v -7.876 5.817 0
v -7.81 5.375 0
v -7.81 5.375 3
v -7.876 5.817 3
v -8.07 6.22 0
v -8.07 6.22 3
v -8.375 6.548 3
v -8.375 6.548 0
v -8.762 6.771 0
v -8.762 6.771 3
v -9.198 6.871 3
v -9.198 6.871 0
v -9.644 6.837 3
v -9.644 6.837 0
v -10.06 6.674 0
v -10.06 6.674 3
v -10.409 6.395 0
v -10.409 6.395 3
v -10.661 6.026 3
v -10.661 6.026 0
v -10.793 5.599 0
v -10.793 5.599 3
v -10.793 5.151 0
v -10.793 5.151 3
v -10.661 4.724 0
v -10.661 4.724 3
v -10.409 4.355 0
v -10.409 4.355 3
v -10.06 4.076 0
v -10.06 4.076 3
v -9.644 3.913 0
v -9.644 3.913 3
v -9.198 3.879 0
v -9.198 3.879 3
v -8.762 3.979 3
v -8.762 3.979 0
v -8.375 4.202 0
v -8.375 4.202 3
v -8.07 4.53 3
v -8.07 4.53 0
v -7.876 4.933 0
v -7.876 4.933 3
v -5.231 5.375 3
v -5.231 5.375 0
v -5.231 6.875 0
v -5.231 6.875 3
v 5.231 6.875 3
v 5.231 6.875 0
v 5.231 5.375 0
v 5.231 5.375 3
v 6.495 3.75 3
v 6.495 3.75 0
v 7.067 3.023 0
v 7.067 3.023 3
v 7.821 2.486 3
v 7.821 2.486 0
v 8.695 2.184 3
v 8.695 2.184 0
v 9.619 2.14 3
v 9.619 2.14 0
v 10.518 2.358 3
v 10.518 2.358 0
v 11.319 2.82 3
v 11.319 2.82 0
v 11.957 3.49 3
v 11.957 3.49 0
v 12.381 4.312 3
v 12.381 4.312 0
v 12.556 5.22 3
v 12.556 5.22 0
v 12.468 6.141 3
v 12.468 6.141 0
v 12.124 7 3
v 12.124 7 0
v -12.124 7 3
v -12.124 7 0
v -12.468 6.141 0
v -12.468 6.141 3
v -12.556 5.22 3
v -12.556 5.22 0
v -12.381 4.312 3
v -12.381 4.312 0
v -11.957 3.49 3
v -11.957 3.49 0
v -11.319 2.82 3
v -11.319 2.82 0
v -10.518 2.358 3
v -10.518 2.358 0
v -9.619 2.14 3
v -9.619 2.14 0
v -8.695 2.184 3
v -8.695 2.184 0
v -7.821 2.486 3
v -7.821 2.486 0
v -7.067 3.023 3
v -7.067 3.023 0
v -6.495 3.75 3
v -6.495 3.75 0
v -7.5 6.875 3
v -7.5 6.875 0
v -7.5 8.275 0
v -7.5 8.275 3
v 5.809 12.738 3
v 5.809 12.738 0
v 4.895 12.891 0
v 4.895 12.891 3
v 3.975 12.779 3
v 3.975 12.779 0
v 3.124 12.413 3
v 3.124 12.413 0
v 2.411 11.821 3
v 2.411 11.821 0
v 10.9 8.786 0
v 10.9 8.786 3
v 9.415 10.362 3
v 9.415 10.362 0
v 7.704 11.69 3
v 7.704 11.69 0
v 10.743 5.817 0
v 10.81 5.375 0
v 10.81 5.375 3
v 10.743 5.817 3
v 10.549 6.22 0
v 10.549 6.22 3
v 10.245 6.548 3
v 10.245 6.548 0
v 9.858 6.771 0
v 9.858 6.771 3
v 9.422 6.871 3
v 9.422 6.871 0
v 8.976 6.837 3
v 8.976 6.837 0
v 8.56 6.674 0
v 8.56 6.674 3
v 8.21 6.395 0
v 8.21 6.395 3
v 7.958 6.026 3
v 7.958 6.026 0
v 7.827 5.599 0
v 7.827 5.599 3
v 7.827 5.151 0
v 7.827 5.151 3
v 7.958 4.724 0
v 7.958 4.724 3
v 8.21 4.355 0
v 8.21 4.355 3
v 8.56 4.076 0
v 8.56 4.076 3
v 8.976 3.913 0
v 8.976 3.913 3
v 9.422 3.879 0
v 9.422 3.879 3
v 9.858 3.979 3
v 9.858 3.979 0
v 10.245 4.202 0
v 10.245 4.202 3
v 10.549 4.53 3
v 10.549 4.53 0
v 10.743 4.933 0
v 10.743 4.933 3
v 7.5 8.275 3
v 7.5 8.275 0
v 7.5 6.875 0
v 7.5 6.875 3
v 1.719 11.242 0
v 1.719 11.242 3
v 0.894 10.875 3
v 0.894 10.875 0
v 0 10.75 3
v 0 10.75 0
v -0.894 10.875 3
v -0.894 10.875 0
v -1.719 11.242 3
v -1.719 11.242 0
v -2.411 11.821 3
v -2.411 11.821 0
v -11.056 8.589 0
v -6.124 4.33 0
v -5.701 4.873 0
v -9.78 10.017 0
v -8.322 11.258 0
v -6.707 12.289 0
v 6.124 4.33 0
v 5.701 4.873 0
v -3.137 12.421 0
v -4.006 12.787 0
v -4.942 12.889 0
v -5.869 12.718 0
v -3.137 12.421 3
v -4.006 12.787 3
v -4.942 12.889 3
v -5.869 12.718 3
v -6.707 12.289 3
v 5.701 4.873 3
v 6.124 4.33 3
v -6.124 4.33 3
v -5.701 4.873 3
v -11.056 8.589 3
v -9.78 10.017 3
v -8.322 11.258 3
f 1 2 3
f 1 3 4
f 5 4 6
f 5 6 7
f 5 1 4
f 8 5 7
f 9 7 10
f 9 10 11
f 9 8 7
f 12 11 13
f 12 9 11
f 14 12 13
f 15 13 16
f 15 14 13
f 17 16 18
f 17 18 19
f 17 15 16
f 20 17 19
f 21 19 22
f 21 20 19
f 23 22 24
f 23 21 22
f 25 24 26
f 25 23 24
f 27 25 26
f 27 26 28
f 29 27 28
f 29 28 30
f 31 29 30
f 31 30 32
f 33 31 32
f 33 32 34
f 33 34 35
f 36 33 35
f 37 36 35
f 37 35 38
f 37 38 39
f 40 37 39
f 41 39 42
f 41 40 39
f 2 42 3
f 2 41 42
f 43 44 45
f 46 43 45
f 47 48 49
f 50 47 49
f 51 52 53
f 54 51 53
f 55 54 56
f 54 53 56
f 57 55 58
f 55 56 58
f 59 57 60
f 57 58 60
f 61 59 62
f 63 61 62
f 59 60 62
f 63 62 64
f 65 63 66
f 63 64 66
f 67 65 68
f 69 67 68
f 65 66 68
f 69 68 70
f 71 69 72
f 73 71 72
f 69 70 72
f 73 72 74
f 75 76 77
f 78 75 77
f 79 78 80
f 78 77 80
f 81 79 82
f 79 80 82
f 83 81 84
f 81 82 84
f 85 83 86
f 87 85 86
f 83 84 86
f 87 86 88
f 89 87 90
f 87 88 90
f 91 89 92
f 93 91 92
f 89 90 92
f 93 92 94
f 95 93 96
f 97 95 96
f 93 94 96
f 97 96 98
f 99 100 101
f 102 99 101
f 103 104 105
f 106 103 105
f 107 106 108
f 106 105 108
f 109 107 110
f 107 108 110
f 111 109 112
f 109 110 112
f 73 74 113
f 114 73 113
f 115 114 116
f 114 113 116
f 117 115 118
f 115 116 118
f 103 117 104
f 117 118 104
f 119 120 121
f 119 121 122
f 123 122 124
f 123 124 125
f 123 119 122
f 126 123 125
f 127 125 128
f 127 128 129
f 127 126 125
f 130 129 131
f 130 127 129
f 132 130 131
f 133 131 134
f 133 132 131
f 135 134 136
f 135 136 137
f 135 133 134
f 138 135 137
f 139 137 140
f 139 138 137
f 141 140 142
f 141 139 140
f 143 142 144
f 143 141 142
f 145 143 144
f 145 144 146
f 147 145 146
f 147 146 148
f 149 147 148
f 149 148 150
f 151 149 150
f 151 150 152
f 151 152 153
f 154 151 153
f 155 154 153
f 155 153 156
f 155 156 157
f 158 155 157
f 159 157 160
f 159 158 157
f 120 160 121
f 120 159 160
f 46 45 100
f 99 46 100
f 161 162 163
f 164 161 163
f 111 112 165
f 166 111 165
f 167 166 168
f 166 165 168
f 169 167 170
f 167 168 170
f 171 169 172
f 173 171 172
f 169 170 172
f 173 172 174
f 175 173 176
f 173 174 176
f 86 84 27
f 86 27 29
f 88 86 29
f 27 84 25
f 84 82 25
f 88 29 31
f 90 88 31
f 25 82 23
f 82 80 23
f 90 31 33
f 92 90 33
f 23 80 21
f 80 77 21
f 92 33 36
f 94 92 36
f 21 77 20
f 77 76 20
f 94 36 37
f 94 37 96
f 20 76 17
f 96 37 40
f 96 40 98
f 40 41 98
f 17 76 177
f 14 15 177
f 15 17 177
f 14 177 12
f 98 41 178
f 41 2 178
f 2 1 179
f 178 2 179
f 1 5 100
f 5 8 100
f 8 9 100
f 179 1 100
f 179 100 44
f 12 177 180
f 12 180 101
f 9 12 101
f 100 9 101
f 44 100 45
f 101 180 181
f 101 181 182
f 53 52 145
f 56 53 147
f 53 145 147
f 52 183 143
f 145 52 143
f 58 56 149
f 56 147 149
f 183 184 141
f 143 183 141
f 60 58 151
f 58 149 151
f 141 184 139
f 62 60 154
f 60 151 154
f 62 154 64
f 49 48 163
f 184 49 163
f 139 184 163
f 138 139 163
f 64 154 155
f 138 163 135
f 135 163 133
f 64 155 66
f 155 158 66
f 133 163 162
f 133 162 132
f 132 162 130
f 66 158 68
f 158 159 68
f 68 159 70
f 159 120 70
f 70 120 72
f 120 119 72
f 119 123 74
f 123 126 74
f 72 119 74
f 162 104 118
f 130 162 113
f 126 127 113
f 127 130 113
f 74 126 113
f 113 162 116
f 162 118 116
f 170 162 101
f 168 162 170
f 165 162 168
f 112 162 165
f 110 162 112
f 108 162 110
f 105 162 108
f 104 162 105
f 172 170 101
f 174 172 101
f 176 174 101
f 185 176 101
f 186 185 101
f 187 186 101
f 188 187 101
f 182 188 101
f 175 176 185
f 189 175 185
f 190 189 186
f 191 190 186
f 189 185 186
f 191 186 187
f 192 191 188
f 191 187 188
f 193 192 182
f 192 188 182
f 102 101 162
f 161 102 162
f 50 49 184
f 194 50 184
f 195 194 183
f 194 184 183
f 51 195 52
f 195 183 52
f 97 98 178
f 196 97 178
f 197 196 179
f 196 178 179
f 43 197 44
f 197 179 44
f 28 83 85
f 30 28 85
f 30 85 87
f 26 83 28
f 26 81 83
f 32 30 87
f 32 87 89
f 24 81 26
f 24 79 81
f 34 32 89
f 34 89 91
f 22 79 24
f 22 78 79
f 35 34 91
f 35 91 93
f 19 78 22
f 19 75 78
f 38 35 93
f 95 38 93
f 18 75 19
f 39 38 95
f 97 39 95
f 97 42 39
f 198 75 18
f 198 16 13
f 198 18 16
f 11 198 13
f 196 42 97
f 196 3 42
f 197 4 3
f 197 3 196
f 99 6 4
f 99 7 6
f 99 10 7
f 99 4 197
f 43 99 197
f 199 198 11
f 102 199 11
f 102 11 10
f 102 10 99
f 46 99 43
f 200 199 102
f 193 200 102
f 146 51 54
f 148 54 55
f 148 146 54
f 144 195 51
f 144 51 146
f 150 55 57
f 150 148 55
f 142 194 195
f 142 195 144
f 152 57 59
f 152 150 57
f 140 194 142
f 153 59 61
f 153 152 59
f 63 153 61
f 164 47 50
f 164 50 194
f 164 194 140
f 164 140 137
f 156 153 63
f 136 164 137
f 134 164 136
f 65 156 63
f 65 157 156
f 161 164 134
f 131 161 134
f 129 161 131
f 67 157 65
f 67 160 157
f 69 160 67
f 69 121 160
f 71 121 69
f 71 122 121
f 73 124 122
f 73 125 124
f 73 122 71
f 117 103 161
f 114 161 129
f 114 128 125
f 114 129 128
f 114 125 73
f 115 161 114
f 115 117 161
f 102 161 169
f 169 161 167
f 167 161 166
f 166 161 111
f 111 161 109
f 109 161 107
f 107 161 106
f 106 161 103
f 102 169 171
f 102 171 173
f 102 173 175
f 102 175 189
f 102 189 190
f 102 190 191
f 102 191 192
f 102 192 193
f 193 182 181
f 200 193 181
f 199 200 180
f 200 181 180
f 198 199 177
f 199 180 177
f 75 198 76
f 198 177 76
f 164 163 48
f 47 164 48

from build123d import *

# Parameters (mm, degrees)
ESQUISSE1_R        = 1.5
BOSS_EXTRU_2_DEPTH = 3


with BuildPart() as part:
    # Esquisse1 → Boss.-Extru.2 (new body)
    with BuildSketch(Plane.XY):
        with BuildLine():
            Line((-5.230618988, 6.875), (-7.5, 6.875))
            Line((-7.5, 6.875), (-7.5, 8.275))
            Line((-7.5, 8.275), (7.5, 8.275))
            Line((7.5, 8.275), (7.5, 6.875))
            Line((7.5, 6.875), (5.230618988, 6.875))
            Line((5.230618988, 6.875), (5.230618988, 5.375))
            ThreePointArc((5.230618988, 5.375), (5.918936429, 4.606103727), (6.495190528, 3.75))
            ThreePointArc((6.495190528, 3.75), (10.934773091, 2.560417438), (12.124355653, 7))
            ThreePointArc((12.124355653, 7), (9.414650572, 10.36167721), (5.80943088, 12.737759334))
            ThreePointArc((5.80943088, 12.737759334), (3.975330286, 12.779130538), (2.411034891, 11.820685714))
            ThreePointArc((2.411034891, 11.820685714), (0, 10.75), (-2.411034891, 11.820685714))
            ThreePointArc((-2.411034891, 11.820685714), (-4.47014813, 12.872261577), (-6.707371512, 12.288660114))
            ThreePointArc((-6.707371512, 12.288660114), (-9.780131311, 10.017436376), (-12.124355653, 7))
            ThreePointArc((-12.124355653, 7), (-10.934773091, 2.560417438), (-6.495190528, 3.75))
            ThreePointArc((-6.495190528, 3.75), (-5.918936429, 4.606103727), (-5.230618988, 5.375))
            Line((-5.230618988, 5.375), (-5.230618988, 6.875))
        make_face()
        with Locations((9.309773091, 5.375)):
            Circle(ESQUISSE1_R, mode=Mode.SUBTRACT)
        with Locations((-9.309773091, 5.375)):
            Circle(ESQUISSE1_R, mode=Mode.SUBTRACT)
    extrude(amount=BOSS_EXTRU_2_DEPTH)


solid = part.part
